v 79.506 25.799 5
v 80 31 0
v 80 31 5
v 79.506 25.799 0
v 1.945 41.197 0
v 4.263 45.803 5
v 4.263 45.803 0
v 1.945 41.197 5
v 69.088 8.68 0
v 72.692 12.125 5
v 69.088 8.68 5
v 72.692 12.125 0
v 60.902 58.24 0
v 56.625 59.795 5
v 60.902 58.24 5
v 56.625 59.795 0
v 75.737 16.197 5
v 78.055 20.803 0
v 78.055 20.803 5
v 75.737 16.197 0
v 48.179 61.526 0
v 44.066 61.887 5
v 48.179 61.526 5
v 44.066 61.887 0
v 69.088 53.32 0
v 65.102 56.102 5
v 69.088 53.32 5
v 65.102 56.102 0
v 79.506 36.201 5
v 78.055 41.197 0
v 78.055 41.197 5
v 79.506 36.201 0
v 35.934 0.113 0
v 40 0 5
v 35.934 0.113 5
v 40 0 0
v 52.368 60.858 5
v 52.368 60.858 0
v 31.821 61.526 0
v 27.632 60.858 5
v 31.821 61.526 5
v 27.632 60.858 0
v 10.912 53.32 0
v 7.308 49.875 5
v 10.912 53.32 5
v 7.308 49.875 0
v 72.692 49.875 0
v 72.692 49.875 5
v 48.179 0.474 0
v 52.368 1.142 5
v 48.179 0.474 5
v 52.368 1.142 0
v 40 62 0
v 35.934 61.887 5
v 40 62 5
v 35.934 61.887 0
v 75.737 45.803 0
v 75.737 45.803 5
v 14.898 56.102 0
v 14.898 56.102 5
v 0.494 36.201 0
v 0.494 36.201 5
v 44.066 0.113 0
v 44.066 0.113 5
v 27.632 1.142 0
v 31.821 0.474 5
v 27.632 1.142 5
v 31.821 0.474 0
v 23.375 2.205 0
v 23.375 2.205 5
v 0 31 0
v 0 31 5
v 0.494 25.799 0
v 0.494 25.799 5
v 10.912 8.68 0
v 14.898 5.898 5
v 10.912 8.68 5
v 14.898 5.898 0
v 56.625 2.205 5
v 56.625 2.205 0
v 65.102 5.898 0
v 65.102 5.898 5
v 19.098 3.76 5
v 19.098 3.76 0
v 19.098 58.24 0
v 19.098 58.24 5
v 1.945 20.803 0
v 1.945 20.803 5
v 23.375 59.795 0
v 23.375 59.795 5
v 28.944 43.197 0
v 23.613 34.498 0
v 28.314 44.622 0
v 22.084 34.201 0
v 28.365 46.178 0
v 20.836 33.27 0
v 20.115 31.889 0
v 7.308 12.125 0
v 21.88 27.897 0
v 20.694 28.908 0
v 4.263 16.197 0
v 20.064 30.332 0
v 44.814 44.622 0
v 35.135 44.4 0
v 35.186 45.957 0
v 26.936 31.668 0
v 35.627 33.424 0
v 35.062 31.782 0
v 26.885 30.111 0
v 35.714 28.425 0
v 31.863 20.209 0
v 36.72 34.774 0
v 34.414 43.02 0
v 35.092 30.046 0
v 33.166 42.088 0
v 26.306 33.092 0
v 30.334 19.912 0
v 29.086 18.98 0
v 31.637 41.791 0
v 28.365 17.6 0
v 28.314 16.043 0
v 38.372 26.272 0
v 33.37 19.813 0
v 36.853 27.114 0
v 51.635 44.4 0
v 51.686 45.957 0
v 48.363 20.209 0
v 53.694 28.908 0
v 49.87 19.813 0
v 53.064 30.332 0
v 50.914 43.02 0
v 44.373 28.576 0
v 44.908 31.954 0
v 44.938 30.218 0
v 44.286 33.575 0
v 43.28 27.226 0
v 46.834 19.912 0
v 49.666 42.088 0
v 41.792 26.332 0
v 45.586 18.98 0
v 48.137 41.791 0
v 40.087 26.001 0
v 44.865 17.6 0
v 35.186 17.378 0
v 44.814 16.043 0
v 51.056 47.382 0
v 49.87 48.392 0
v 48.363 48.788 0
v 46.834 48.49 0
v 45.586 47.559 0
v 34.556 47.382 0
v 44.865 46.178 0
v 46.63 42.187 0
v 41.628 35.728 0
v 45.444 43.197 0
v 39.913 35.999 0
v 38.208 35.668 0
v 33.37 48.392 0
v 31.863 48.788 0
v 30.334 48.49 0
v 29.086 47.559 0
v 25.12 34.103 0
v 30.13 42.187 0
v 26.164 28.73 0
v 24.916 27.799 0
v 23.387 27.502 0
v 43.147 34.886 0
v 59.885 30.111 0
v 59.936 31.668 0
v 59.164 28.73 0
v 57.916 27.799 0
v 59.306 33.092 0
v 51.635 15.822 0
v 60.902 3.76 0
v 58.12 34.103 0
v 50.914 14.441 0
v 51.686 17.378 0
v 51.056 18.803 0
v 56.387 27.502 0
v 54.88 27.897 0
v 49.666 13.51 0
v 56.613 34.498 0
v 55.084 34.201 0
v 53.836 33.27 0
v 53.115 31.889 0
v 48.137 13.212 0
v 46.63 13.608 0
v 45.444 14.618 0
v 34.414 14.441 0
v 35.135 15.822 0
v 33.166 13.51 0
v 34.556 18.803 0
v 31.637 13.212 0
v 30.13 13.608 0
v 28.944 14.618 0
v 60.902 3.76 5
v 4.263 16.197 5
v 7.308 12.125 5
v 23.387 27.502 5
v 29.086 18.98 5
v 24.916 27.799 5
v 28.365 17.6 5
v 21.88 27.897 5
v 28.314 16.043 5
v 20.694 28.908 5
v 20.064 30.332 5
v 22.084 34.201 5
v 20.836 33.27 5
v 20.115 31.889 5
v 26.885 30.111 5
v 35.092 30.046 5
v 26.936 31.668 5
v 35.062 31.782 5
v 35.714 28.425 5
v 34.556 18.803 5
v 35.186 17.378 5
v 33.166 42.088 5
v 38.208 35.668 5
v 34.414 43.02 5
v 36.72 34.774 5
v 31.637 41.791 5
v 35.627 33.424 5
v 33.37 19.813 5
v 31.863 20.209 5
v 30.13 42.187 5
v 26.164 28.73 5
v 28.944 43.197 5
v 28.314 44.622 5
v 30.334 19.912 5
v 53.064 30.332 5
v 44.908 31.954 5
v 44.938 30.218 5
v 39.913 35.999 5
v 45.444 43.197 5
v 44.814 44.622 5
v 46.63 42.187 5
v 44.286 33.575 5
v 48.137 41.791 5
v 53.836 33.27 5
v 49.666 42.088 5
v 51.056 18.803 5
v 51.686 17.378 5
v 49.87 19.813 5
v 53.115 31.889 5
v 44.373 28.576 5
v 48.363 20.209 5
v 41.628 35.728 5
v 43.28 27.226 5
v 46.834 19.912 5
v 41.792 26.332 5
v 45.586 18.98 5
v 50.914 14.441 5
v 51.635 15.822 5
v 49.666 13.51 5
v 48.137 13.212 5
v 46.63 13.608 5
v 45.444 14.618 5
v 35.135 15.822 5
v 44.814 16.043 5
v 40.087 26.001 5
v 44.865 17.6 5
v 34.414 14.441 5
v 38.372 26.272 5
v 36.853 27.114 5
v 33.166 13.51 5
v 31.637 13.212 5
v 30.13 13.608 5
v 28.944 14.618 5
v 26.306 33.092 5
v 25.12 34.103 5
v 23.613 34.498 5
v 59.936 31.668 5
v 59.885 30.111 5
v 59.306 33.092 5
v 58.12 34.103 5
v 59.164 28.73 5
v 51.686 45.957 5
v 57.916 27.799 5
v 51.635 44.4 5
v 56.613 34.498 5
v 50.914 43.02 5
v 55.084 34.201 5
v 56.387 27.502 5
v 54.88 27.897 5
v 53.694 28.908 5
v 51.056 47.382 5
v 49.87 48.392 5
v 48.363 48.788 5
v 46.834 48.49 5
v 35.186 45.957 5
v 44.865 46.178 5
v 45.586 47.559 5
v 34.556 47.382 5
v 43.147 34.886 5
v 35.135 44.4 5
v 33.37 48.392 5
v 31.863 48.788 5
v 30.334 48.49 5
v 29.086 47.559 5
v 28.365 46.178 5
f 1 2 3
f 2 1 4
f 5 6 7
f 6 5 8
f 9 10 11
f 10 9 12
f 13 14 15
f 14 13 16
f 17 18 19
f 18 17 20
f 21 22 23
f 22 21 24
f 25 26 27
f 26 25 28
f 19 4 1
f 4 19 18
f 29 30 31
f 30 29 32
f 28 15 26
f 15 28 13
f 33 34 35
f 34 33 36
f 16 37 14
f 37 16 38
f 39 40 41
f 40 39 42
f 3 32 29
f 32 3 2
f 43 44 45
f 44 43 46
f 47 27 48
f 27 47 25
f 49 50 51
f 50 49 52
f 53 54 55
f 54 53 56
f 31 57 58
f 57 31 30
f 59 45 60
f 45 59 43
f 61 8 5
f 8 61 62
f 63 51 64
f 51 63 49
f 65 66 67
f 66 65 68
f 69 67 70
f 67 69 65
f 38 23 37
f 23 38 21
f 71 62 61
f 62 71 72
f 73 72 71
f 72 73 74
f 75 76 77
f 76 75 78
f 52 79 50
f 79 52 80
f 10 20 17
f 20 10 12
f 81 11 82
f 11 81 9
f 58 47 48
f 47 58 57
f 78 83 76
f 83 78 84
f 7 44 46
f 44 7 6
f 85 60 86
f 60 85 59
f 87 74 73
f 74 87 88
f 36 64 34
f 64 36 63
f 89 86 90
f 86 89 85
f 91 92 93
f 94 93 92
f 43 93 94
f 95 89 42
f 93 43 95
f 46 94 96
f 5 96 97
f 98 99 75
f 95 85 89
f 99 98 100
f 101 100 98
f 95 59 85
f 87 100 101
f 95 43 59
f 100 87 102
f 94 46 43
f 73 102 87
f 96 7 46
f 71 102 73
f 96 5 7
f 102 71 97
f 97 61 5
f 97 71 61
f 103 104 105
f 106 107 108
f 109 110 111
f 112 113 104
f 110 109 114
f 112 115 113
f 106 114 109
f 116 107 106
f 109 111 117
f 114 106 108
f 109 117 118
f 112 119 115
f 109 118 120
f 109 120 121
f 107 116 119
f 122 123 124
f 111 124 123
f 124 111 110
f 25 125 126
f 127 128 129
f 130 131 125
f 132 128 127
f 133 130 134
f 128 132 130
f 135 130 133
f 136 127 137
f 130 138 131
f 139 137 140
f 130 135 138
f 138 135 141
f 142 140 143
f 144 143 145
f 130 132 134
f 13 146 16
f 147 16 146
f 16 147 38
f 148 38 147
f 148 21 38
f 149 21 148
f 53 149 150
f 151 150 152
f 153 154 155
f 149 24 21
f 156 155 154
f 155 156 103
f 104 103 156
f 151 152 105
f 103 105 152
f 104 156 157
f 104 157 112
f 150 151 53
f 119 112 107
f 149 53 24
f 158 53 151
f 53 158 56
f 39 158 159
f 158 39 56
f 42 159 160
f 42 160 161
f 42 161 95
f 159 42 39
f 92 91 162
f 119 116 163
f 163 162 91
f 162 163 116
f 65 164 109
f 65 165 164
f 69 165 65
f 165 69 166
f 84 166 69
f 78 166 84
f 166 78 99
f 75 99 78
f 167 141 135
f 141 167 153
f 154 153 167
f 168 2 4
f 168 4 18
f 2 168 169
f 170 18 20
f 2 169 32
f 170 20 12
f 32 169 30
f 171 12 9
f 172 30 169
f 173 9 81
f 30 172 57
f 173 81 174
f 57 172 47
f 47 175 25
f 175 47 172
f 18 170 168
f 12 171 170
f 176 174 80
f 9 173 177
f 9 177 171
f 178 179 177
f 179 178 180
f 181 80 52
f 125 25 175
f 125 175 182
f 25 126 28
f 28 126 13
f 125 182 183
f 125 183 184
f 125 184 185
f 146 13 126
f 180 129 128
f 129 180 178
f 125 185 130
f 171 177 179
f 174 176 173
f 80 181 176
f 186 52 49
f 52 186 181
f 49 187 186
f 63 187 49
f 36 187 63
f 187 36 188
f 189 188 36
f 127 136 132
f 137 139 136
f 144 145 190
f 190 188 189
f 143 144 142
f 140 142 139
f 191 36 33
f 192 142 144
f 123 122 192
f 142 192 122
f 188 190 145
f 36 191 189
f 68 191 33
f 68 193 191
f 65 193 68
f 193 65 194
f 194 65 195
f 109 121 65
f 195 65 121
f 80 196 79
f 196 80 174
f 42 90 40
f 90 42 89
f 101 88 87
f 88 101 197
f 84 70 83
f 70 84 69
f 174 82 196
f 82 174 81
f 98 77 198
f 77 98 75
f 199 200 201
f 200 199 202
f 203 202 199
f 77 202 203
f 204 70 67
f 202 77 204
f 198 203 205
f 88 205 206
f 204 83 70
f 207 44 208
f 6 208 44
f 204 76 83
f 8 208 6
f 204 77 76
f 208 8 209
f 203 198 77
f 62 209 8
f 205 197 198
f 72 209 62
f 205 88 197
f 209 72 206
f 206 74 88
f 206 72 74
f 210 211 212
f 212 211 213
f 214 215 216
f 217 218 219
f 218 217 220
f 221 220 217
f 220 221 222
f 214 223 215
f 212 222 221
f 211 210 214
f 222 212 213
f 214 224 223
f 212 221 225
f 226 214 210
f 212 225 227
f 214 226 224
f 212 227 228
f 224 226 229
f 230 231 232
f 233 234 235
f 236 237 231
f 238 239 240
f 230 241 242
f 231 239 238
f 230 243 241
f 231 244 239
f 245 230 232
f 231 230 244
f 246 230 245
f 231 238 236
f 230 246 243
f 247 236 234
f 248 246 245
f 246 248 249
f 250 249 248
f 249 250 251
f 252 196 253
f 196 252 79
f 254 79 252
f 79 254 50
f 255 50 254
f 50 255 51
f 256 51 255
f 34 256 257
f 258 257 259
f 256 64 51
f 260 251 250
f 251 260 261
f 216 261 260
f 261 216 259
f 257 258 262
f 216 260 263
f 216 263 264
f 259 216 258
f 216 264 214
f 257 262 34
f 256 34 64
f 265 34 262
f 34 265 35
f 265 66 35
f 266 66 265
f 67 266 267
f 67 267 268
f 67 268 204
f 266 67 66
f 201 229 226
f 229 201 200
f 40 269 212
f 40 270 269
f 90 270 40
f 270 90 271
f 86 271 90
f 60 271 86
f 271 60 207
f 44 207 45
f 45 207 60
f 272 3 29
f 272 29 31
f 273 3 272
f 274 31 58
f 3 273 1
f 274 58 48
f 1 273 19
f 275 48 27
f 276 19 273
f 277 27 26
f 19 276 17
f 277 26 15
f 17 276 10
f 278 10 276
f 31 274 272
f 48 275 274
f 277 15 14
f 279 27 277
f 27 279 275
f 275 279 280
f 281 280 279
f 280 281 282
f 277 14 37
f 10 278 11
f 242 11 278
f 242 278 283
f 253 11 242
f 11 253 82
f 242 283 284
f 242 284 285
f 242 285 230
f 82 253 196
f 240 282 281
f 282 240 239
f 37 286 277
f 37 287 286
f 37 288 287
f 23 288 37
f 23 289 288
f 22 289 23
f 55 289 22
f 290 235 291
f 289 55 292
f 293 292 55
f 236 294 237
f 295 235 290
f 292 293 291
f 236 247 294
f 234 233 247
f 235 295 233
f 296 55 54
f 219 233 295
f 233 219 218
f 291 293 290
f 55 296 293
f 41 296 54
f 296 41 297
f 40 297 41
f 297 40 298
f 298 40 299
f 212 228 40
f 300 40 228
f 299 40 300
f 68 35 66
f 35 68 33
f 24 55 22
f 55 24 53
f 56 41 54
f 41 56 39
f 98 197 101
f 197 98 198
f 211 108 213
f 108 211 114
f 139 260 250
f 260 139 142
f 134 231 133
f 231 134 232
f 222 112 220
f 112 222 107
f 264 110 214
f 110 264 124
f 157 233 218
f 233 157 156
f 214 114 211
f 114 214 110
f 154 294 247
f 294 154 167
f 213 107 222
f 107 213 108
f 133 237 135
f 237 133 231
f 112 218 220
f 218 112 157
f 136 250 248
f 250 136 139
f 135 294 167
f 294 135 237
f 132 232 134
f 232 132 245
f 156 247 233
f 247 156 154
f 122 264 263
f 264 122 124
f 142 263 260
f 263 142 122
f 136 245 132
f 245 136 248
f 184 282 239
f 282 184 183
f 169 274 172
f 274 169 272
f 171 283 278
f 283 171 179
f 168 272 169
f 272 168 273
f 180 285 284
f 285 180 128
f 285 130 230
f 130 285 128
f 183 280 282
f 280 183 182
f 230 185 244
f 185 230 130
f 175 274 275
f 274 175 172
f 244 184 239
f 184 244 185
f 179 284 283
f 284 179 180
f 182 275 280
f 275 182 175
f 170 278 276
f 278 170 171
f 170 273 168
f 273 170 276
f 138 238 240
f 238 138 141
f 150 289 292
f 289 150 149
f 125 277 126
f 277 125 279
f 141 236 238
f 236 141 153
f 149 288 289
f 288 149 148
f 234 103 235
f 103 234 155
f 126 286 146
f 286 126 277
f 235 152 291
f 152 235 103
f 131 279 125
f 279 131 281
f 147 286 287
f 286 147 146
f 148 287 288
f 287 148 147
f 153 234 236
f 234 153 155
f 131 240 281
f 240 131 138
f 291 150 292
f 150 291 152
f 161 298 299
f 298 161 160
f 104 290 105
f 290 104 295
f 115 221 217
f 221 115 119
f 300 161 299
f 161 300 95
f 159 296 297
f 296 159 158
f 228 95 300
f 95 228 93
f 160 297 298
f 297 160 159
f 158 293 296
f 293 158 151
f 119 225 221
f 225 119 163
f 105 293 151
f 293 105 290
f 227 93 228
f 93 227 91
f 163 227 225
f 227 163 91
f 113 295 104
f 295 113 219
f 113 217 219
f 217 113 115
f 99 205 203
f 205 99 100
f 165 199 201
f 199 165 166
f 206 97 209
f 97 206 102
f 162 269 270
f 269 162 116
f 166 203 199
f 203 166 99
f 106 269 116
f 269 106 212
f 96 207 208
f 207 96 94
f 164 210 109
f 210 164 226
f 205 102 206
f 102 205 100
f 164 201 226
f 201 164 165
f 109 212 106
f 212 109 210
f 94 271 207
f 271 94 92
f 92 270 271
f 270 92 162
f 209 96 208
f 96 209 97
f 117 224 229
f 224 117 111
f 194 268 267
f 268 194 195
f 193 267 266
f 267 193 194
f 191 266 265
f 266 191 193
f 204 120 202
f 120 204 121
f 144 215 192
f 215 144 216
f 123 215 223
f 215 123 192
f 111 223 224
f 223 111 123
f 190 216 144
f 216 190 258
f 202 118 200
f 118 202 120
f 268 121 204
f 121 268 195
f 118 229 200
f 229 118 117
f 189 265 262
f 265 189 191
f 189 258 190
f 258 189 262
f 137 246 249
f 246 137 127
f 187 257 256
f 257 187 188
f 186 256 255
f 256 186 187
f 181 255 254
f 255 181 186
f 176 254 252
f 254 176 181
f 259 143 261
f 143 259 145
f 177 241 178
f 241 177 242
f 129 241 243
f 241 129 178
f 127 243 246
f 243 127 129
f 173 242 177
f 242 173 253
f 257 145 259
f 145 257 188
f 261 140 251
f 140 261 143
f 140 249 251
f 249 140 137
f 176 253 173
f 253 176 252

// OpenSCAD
$fn = 32;

// ----------------------------------------------------------------------
// Cam plate: double_lobe cam, base R28
// ----------------------------------------------------------------------

// --- parameters (mm) ---
base_r = 28;              // base circle radius
lobe_h = 12;              // cam lobe rise
bore_r = 5;               // shaft bore radius
plate_t = 5;              // plate thickness, Z (extrusion height)
ring_r = 16.5;            // lightening ring radius
bolt_r = 3.5;             // lightening hole radius

profile = [[80, 31], [79.506, 36.201], [78.055, 41.197], [75.737, 45.803], [72.692, 49.875], [69.088, 53.32], [65.102, 56.102], [60.902, 58.24], [56.625, 59.795], [52.368, 60.858], [48.179, 61.526], [44.066, 61.887], [40, 62], [35.934, 61.887], [31.821, 61.526], [27.632, 60.858], [23.375, 59.795], [19.098, 58.24], [14.898, 56.102], [10.912, 53.32], [7.308, 49.875], [4.263, 45.803], [1.945, 41.197], [0.494, 36.201], [0, 31], [0.494, 25.799], [1.945, 20.803], [4.263, 16.197], [7.308, 12.125], [10.912, 8.68], [14.898, 5.898], [19.098, 3.76], [23.375, 2.205], [27.632, 1.142], [31.821, 0.474], [35.934, 0.113], [40, 0], [44.066, 0.113], [48.179, 0.474], [52.368, 1.142], [56.625, 2.205], [60.902, 3.76], [65.102, 5.898], [69.088, 8.68], [72.692, 12.125], [75.737, 16.197], [78.055, 20.803], [79.506, 25.799]];  // primary outline, 48 points, counter clockwise
void_1 = [[44.908, 31.954], [44.286, 33.575], [43.147, 34.886], [41.628, 35.728], [39.913, 35.999], [38.208, 35.668], [36.72, 34.774], [35.627, 33.424], [35.062, 31.782], [35.092, 30.046], [35.714, 28.425], [36.853, 27.114], [38.372, 26.272], [40.087, 26.001], [41.792, 26.332], [43.28, 27.226], [44.373, 28.576], [44.938, 30.218]];  // shaft bore, 18 points
void_2 = [[59.936, 31.668], [59.306, 33.092], [58.12, 34.103], [56.613, 34.498], [55.084, 34.201], [53.836, 33.27], [53.115, 31.889], [53.064, 30.332], [53.694, 28.908], [54.88, 27.897], [56.387, 27.502], [57.916, 27.799], [59.164, 28.73], [59.885, 30.111]];  // lightening hole 1, 14 points
void_3 = [[51.686, 45.957], [51.056, 47.382], [49.87, 48.392], [48.363, 48.788], [46.834, 48.49], [45.586, 47.559], [44.865, 46.178], [44.814, 44.622], [45.444, 43.197], [46.63, 42.187], [48.137, 41.791], [49.666, 42.088], [50.914, 43.02], [51.635, 44.4]];  // lightening hole 2, 14 points
void_4 = [[35.186, 45.957], [34.556, 47.382], [33.37, 48.392], [31.863, 48.788], [30.334, 48.49], [29.086, 47.559], [28.365, 46.178], [28.314, 44.622], [28.944, 43.197], [30.13, 42.187], [31.637, 41.791], [33.166, 42.088], [34.414, 43.02], [35.135, 44.4]];  // lightening hole 3, 14 points
void_5 = [[26.936, 31.668], [26.306, 33.092], [25.12, 34.103], [23.613, 34.498], [22.084, 34.201], [20.836, 33.27], [20.115, 31.889], [20.064, 30.332], [20.694, 28.908], [21.88, 27.897], [23.387, 27.502], [24.916, 27.799], [26.164, 28.73], [26.885, 30.111]];  // lightening hole 4, 14 points
void_6 = [[35.186, 17.378], [34.556, 18.803], [33.37, 19.813], [31.863, 20.209], [30.334, 19.912], [29.086, 18.98], [28.365, 17.6], [28.314, 16.043], [28.944, 14.618], [30.13, 13.608], [31.637, 13.212], [33.166, 13.51], [34.414, 14.441], [35.135, 15.822]];  // lightening hole 5, 14 points
void_7 = [[51.686, 17.378], [51.056, 18.803], [49.87, 19.813], [48.363, 20.209], [46.834, 19.912], [45.586, 18.98], [44.865, 17.6], [44.814, 16.043], [45.444, 14.618], [46.63, 13.608], [48.137, 13.212], [49.666, 13.51], [50.914, 14.441], [51.635, 15.822]];  // lightening hole 6, 14 points

// --- the one profile operation ---
difference() {
  linear_extrude(height = plate_t) polygon(points = profile);
  translate([0, 0, -1])
    linear_extrude(height = plate_t + 2) polygon(points = void_1);
  translate([0, 0, -1])
    linear_extrude(height = plate_t + 2) polygon(points = void_2);
  translate([0, 0, -1])
    linear_extrude(height = plate_t + 2) polygon(points = void_3);
  translate([0, 0, -1])
    linear_extrude(height = plate_t + 2) polygon(points = void_4);
  translate([0, 0, -1])
    linear_extrude(height = plate_t + 2) polygon(points = void_5);
  translate([0, 0, -1])
    linear_extrude(height = plate_t + 2) polygon(points = void_6);
  translate([0, 0, -1])
    linear_extrude(height = plate_t + 2) polygon(points = void_7);
}
